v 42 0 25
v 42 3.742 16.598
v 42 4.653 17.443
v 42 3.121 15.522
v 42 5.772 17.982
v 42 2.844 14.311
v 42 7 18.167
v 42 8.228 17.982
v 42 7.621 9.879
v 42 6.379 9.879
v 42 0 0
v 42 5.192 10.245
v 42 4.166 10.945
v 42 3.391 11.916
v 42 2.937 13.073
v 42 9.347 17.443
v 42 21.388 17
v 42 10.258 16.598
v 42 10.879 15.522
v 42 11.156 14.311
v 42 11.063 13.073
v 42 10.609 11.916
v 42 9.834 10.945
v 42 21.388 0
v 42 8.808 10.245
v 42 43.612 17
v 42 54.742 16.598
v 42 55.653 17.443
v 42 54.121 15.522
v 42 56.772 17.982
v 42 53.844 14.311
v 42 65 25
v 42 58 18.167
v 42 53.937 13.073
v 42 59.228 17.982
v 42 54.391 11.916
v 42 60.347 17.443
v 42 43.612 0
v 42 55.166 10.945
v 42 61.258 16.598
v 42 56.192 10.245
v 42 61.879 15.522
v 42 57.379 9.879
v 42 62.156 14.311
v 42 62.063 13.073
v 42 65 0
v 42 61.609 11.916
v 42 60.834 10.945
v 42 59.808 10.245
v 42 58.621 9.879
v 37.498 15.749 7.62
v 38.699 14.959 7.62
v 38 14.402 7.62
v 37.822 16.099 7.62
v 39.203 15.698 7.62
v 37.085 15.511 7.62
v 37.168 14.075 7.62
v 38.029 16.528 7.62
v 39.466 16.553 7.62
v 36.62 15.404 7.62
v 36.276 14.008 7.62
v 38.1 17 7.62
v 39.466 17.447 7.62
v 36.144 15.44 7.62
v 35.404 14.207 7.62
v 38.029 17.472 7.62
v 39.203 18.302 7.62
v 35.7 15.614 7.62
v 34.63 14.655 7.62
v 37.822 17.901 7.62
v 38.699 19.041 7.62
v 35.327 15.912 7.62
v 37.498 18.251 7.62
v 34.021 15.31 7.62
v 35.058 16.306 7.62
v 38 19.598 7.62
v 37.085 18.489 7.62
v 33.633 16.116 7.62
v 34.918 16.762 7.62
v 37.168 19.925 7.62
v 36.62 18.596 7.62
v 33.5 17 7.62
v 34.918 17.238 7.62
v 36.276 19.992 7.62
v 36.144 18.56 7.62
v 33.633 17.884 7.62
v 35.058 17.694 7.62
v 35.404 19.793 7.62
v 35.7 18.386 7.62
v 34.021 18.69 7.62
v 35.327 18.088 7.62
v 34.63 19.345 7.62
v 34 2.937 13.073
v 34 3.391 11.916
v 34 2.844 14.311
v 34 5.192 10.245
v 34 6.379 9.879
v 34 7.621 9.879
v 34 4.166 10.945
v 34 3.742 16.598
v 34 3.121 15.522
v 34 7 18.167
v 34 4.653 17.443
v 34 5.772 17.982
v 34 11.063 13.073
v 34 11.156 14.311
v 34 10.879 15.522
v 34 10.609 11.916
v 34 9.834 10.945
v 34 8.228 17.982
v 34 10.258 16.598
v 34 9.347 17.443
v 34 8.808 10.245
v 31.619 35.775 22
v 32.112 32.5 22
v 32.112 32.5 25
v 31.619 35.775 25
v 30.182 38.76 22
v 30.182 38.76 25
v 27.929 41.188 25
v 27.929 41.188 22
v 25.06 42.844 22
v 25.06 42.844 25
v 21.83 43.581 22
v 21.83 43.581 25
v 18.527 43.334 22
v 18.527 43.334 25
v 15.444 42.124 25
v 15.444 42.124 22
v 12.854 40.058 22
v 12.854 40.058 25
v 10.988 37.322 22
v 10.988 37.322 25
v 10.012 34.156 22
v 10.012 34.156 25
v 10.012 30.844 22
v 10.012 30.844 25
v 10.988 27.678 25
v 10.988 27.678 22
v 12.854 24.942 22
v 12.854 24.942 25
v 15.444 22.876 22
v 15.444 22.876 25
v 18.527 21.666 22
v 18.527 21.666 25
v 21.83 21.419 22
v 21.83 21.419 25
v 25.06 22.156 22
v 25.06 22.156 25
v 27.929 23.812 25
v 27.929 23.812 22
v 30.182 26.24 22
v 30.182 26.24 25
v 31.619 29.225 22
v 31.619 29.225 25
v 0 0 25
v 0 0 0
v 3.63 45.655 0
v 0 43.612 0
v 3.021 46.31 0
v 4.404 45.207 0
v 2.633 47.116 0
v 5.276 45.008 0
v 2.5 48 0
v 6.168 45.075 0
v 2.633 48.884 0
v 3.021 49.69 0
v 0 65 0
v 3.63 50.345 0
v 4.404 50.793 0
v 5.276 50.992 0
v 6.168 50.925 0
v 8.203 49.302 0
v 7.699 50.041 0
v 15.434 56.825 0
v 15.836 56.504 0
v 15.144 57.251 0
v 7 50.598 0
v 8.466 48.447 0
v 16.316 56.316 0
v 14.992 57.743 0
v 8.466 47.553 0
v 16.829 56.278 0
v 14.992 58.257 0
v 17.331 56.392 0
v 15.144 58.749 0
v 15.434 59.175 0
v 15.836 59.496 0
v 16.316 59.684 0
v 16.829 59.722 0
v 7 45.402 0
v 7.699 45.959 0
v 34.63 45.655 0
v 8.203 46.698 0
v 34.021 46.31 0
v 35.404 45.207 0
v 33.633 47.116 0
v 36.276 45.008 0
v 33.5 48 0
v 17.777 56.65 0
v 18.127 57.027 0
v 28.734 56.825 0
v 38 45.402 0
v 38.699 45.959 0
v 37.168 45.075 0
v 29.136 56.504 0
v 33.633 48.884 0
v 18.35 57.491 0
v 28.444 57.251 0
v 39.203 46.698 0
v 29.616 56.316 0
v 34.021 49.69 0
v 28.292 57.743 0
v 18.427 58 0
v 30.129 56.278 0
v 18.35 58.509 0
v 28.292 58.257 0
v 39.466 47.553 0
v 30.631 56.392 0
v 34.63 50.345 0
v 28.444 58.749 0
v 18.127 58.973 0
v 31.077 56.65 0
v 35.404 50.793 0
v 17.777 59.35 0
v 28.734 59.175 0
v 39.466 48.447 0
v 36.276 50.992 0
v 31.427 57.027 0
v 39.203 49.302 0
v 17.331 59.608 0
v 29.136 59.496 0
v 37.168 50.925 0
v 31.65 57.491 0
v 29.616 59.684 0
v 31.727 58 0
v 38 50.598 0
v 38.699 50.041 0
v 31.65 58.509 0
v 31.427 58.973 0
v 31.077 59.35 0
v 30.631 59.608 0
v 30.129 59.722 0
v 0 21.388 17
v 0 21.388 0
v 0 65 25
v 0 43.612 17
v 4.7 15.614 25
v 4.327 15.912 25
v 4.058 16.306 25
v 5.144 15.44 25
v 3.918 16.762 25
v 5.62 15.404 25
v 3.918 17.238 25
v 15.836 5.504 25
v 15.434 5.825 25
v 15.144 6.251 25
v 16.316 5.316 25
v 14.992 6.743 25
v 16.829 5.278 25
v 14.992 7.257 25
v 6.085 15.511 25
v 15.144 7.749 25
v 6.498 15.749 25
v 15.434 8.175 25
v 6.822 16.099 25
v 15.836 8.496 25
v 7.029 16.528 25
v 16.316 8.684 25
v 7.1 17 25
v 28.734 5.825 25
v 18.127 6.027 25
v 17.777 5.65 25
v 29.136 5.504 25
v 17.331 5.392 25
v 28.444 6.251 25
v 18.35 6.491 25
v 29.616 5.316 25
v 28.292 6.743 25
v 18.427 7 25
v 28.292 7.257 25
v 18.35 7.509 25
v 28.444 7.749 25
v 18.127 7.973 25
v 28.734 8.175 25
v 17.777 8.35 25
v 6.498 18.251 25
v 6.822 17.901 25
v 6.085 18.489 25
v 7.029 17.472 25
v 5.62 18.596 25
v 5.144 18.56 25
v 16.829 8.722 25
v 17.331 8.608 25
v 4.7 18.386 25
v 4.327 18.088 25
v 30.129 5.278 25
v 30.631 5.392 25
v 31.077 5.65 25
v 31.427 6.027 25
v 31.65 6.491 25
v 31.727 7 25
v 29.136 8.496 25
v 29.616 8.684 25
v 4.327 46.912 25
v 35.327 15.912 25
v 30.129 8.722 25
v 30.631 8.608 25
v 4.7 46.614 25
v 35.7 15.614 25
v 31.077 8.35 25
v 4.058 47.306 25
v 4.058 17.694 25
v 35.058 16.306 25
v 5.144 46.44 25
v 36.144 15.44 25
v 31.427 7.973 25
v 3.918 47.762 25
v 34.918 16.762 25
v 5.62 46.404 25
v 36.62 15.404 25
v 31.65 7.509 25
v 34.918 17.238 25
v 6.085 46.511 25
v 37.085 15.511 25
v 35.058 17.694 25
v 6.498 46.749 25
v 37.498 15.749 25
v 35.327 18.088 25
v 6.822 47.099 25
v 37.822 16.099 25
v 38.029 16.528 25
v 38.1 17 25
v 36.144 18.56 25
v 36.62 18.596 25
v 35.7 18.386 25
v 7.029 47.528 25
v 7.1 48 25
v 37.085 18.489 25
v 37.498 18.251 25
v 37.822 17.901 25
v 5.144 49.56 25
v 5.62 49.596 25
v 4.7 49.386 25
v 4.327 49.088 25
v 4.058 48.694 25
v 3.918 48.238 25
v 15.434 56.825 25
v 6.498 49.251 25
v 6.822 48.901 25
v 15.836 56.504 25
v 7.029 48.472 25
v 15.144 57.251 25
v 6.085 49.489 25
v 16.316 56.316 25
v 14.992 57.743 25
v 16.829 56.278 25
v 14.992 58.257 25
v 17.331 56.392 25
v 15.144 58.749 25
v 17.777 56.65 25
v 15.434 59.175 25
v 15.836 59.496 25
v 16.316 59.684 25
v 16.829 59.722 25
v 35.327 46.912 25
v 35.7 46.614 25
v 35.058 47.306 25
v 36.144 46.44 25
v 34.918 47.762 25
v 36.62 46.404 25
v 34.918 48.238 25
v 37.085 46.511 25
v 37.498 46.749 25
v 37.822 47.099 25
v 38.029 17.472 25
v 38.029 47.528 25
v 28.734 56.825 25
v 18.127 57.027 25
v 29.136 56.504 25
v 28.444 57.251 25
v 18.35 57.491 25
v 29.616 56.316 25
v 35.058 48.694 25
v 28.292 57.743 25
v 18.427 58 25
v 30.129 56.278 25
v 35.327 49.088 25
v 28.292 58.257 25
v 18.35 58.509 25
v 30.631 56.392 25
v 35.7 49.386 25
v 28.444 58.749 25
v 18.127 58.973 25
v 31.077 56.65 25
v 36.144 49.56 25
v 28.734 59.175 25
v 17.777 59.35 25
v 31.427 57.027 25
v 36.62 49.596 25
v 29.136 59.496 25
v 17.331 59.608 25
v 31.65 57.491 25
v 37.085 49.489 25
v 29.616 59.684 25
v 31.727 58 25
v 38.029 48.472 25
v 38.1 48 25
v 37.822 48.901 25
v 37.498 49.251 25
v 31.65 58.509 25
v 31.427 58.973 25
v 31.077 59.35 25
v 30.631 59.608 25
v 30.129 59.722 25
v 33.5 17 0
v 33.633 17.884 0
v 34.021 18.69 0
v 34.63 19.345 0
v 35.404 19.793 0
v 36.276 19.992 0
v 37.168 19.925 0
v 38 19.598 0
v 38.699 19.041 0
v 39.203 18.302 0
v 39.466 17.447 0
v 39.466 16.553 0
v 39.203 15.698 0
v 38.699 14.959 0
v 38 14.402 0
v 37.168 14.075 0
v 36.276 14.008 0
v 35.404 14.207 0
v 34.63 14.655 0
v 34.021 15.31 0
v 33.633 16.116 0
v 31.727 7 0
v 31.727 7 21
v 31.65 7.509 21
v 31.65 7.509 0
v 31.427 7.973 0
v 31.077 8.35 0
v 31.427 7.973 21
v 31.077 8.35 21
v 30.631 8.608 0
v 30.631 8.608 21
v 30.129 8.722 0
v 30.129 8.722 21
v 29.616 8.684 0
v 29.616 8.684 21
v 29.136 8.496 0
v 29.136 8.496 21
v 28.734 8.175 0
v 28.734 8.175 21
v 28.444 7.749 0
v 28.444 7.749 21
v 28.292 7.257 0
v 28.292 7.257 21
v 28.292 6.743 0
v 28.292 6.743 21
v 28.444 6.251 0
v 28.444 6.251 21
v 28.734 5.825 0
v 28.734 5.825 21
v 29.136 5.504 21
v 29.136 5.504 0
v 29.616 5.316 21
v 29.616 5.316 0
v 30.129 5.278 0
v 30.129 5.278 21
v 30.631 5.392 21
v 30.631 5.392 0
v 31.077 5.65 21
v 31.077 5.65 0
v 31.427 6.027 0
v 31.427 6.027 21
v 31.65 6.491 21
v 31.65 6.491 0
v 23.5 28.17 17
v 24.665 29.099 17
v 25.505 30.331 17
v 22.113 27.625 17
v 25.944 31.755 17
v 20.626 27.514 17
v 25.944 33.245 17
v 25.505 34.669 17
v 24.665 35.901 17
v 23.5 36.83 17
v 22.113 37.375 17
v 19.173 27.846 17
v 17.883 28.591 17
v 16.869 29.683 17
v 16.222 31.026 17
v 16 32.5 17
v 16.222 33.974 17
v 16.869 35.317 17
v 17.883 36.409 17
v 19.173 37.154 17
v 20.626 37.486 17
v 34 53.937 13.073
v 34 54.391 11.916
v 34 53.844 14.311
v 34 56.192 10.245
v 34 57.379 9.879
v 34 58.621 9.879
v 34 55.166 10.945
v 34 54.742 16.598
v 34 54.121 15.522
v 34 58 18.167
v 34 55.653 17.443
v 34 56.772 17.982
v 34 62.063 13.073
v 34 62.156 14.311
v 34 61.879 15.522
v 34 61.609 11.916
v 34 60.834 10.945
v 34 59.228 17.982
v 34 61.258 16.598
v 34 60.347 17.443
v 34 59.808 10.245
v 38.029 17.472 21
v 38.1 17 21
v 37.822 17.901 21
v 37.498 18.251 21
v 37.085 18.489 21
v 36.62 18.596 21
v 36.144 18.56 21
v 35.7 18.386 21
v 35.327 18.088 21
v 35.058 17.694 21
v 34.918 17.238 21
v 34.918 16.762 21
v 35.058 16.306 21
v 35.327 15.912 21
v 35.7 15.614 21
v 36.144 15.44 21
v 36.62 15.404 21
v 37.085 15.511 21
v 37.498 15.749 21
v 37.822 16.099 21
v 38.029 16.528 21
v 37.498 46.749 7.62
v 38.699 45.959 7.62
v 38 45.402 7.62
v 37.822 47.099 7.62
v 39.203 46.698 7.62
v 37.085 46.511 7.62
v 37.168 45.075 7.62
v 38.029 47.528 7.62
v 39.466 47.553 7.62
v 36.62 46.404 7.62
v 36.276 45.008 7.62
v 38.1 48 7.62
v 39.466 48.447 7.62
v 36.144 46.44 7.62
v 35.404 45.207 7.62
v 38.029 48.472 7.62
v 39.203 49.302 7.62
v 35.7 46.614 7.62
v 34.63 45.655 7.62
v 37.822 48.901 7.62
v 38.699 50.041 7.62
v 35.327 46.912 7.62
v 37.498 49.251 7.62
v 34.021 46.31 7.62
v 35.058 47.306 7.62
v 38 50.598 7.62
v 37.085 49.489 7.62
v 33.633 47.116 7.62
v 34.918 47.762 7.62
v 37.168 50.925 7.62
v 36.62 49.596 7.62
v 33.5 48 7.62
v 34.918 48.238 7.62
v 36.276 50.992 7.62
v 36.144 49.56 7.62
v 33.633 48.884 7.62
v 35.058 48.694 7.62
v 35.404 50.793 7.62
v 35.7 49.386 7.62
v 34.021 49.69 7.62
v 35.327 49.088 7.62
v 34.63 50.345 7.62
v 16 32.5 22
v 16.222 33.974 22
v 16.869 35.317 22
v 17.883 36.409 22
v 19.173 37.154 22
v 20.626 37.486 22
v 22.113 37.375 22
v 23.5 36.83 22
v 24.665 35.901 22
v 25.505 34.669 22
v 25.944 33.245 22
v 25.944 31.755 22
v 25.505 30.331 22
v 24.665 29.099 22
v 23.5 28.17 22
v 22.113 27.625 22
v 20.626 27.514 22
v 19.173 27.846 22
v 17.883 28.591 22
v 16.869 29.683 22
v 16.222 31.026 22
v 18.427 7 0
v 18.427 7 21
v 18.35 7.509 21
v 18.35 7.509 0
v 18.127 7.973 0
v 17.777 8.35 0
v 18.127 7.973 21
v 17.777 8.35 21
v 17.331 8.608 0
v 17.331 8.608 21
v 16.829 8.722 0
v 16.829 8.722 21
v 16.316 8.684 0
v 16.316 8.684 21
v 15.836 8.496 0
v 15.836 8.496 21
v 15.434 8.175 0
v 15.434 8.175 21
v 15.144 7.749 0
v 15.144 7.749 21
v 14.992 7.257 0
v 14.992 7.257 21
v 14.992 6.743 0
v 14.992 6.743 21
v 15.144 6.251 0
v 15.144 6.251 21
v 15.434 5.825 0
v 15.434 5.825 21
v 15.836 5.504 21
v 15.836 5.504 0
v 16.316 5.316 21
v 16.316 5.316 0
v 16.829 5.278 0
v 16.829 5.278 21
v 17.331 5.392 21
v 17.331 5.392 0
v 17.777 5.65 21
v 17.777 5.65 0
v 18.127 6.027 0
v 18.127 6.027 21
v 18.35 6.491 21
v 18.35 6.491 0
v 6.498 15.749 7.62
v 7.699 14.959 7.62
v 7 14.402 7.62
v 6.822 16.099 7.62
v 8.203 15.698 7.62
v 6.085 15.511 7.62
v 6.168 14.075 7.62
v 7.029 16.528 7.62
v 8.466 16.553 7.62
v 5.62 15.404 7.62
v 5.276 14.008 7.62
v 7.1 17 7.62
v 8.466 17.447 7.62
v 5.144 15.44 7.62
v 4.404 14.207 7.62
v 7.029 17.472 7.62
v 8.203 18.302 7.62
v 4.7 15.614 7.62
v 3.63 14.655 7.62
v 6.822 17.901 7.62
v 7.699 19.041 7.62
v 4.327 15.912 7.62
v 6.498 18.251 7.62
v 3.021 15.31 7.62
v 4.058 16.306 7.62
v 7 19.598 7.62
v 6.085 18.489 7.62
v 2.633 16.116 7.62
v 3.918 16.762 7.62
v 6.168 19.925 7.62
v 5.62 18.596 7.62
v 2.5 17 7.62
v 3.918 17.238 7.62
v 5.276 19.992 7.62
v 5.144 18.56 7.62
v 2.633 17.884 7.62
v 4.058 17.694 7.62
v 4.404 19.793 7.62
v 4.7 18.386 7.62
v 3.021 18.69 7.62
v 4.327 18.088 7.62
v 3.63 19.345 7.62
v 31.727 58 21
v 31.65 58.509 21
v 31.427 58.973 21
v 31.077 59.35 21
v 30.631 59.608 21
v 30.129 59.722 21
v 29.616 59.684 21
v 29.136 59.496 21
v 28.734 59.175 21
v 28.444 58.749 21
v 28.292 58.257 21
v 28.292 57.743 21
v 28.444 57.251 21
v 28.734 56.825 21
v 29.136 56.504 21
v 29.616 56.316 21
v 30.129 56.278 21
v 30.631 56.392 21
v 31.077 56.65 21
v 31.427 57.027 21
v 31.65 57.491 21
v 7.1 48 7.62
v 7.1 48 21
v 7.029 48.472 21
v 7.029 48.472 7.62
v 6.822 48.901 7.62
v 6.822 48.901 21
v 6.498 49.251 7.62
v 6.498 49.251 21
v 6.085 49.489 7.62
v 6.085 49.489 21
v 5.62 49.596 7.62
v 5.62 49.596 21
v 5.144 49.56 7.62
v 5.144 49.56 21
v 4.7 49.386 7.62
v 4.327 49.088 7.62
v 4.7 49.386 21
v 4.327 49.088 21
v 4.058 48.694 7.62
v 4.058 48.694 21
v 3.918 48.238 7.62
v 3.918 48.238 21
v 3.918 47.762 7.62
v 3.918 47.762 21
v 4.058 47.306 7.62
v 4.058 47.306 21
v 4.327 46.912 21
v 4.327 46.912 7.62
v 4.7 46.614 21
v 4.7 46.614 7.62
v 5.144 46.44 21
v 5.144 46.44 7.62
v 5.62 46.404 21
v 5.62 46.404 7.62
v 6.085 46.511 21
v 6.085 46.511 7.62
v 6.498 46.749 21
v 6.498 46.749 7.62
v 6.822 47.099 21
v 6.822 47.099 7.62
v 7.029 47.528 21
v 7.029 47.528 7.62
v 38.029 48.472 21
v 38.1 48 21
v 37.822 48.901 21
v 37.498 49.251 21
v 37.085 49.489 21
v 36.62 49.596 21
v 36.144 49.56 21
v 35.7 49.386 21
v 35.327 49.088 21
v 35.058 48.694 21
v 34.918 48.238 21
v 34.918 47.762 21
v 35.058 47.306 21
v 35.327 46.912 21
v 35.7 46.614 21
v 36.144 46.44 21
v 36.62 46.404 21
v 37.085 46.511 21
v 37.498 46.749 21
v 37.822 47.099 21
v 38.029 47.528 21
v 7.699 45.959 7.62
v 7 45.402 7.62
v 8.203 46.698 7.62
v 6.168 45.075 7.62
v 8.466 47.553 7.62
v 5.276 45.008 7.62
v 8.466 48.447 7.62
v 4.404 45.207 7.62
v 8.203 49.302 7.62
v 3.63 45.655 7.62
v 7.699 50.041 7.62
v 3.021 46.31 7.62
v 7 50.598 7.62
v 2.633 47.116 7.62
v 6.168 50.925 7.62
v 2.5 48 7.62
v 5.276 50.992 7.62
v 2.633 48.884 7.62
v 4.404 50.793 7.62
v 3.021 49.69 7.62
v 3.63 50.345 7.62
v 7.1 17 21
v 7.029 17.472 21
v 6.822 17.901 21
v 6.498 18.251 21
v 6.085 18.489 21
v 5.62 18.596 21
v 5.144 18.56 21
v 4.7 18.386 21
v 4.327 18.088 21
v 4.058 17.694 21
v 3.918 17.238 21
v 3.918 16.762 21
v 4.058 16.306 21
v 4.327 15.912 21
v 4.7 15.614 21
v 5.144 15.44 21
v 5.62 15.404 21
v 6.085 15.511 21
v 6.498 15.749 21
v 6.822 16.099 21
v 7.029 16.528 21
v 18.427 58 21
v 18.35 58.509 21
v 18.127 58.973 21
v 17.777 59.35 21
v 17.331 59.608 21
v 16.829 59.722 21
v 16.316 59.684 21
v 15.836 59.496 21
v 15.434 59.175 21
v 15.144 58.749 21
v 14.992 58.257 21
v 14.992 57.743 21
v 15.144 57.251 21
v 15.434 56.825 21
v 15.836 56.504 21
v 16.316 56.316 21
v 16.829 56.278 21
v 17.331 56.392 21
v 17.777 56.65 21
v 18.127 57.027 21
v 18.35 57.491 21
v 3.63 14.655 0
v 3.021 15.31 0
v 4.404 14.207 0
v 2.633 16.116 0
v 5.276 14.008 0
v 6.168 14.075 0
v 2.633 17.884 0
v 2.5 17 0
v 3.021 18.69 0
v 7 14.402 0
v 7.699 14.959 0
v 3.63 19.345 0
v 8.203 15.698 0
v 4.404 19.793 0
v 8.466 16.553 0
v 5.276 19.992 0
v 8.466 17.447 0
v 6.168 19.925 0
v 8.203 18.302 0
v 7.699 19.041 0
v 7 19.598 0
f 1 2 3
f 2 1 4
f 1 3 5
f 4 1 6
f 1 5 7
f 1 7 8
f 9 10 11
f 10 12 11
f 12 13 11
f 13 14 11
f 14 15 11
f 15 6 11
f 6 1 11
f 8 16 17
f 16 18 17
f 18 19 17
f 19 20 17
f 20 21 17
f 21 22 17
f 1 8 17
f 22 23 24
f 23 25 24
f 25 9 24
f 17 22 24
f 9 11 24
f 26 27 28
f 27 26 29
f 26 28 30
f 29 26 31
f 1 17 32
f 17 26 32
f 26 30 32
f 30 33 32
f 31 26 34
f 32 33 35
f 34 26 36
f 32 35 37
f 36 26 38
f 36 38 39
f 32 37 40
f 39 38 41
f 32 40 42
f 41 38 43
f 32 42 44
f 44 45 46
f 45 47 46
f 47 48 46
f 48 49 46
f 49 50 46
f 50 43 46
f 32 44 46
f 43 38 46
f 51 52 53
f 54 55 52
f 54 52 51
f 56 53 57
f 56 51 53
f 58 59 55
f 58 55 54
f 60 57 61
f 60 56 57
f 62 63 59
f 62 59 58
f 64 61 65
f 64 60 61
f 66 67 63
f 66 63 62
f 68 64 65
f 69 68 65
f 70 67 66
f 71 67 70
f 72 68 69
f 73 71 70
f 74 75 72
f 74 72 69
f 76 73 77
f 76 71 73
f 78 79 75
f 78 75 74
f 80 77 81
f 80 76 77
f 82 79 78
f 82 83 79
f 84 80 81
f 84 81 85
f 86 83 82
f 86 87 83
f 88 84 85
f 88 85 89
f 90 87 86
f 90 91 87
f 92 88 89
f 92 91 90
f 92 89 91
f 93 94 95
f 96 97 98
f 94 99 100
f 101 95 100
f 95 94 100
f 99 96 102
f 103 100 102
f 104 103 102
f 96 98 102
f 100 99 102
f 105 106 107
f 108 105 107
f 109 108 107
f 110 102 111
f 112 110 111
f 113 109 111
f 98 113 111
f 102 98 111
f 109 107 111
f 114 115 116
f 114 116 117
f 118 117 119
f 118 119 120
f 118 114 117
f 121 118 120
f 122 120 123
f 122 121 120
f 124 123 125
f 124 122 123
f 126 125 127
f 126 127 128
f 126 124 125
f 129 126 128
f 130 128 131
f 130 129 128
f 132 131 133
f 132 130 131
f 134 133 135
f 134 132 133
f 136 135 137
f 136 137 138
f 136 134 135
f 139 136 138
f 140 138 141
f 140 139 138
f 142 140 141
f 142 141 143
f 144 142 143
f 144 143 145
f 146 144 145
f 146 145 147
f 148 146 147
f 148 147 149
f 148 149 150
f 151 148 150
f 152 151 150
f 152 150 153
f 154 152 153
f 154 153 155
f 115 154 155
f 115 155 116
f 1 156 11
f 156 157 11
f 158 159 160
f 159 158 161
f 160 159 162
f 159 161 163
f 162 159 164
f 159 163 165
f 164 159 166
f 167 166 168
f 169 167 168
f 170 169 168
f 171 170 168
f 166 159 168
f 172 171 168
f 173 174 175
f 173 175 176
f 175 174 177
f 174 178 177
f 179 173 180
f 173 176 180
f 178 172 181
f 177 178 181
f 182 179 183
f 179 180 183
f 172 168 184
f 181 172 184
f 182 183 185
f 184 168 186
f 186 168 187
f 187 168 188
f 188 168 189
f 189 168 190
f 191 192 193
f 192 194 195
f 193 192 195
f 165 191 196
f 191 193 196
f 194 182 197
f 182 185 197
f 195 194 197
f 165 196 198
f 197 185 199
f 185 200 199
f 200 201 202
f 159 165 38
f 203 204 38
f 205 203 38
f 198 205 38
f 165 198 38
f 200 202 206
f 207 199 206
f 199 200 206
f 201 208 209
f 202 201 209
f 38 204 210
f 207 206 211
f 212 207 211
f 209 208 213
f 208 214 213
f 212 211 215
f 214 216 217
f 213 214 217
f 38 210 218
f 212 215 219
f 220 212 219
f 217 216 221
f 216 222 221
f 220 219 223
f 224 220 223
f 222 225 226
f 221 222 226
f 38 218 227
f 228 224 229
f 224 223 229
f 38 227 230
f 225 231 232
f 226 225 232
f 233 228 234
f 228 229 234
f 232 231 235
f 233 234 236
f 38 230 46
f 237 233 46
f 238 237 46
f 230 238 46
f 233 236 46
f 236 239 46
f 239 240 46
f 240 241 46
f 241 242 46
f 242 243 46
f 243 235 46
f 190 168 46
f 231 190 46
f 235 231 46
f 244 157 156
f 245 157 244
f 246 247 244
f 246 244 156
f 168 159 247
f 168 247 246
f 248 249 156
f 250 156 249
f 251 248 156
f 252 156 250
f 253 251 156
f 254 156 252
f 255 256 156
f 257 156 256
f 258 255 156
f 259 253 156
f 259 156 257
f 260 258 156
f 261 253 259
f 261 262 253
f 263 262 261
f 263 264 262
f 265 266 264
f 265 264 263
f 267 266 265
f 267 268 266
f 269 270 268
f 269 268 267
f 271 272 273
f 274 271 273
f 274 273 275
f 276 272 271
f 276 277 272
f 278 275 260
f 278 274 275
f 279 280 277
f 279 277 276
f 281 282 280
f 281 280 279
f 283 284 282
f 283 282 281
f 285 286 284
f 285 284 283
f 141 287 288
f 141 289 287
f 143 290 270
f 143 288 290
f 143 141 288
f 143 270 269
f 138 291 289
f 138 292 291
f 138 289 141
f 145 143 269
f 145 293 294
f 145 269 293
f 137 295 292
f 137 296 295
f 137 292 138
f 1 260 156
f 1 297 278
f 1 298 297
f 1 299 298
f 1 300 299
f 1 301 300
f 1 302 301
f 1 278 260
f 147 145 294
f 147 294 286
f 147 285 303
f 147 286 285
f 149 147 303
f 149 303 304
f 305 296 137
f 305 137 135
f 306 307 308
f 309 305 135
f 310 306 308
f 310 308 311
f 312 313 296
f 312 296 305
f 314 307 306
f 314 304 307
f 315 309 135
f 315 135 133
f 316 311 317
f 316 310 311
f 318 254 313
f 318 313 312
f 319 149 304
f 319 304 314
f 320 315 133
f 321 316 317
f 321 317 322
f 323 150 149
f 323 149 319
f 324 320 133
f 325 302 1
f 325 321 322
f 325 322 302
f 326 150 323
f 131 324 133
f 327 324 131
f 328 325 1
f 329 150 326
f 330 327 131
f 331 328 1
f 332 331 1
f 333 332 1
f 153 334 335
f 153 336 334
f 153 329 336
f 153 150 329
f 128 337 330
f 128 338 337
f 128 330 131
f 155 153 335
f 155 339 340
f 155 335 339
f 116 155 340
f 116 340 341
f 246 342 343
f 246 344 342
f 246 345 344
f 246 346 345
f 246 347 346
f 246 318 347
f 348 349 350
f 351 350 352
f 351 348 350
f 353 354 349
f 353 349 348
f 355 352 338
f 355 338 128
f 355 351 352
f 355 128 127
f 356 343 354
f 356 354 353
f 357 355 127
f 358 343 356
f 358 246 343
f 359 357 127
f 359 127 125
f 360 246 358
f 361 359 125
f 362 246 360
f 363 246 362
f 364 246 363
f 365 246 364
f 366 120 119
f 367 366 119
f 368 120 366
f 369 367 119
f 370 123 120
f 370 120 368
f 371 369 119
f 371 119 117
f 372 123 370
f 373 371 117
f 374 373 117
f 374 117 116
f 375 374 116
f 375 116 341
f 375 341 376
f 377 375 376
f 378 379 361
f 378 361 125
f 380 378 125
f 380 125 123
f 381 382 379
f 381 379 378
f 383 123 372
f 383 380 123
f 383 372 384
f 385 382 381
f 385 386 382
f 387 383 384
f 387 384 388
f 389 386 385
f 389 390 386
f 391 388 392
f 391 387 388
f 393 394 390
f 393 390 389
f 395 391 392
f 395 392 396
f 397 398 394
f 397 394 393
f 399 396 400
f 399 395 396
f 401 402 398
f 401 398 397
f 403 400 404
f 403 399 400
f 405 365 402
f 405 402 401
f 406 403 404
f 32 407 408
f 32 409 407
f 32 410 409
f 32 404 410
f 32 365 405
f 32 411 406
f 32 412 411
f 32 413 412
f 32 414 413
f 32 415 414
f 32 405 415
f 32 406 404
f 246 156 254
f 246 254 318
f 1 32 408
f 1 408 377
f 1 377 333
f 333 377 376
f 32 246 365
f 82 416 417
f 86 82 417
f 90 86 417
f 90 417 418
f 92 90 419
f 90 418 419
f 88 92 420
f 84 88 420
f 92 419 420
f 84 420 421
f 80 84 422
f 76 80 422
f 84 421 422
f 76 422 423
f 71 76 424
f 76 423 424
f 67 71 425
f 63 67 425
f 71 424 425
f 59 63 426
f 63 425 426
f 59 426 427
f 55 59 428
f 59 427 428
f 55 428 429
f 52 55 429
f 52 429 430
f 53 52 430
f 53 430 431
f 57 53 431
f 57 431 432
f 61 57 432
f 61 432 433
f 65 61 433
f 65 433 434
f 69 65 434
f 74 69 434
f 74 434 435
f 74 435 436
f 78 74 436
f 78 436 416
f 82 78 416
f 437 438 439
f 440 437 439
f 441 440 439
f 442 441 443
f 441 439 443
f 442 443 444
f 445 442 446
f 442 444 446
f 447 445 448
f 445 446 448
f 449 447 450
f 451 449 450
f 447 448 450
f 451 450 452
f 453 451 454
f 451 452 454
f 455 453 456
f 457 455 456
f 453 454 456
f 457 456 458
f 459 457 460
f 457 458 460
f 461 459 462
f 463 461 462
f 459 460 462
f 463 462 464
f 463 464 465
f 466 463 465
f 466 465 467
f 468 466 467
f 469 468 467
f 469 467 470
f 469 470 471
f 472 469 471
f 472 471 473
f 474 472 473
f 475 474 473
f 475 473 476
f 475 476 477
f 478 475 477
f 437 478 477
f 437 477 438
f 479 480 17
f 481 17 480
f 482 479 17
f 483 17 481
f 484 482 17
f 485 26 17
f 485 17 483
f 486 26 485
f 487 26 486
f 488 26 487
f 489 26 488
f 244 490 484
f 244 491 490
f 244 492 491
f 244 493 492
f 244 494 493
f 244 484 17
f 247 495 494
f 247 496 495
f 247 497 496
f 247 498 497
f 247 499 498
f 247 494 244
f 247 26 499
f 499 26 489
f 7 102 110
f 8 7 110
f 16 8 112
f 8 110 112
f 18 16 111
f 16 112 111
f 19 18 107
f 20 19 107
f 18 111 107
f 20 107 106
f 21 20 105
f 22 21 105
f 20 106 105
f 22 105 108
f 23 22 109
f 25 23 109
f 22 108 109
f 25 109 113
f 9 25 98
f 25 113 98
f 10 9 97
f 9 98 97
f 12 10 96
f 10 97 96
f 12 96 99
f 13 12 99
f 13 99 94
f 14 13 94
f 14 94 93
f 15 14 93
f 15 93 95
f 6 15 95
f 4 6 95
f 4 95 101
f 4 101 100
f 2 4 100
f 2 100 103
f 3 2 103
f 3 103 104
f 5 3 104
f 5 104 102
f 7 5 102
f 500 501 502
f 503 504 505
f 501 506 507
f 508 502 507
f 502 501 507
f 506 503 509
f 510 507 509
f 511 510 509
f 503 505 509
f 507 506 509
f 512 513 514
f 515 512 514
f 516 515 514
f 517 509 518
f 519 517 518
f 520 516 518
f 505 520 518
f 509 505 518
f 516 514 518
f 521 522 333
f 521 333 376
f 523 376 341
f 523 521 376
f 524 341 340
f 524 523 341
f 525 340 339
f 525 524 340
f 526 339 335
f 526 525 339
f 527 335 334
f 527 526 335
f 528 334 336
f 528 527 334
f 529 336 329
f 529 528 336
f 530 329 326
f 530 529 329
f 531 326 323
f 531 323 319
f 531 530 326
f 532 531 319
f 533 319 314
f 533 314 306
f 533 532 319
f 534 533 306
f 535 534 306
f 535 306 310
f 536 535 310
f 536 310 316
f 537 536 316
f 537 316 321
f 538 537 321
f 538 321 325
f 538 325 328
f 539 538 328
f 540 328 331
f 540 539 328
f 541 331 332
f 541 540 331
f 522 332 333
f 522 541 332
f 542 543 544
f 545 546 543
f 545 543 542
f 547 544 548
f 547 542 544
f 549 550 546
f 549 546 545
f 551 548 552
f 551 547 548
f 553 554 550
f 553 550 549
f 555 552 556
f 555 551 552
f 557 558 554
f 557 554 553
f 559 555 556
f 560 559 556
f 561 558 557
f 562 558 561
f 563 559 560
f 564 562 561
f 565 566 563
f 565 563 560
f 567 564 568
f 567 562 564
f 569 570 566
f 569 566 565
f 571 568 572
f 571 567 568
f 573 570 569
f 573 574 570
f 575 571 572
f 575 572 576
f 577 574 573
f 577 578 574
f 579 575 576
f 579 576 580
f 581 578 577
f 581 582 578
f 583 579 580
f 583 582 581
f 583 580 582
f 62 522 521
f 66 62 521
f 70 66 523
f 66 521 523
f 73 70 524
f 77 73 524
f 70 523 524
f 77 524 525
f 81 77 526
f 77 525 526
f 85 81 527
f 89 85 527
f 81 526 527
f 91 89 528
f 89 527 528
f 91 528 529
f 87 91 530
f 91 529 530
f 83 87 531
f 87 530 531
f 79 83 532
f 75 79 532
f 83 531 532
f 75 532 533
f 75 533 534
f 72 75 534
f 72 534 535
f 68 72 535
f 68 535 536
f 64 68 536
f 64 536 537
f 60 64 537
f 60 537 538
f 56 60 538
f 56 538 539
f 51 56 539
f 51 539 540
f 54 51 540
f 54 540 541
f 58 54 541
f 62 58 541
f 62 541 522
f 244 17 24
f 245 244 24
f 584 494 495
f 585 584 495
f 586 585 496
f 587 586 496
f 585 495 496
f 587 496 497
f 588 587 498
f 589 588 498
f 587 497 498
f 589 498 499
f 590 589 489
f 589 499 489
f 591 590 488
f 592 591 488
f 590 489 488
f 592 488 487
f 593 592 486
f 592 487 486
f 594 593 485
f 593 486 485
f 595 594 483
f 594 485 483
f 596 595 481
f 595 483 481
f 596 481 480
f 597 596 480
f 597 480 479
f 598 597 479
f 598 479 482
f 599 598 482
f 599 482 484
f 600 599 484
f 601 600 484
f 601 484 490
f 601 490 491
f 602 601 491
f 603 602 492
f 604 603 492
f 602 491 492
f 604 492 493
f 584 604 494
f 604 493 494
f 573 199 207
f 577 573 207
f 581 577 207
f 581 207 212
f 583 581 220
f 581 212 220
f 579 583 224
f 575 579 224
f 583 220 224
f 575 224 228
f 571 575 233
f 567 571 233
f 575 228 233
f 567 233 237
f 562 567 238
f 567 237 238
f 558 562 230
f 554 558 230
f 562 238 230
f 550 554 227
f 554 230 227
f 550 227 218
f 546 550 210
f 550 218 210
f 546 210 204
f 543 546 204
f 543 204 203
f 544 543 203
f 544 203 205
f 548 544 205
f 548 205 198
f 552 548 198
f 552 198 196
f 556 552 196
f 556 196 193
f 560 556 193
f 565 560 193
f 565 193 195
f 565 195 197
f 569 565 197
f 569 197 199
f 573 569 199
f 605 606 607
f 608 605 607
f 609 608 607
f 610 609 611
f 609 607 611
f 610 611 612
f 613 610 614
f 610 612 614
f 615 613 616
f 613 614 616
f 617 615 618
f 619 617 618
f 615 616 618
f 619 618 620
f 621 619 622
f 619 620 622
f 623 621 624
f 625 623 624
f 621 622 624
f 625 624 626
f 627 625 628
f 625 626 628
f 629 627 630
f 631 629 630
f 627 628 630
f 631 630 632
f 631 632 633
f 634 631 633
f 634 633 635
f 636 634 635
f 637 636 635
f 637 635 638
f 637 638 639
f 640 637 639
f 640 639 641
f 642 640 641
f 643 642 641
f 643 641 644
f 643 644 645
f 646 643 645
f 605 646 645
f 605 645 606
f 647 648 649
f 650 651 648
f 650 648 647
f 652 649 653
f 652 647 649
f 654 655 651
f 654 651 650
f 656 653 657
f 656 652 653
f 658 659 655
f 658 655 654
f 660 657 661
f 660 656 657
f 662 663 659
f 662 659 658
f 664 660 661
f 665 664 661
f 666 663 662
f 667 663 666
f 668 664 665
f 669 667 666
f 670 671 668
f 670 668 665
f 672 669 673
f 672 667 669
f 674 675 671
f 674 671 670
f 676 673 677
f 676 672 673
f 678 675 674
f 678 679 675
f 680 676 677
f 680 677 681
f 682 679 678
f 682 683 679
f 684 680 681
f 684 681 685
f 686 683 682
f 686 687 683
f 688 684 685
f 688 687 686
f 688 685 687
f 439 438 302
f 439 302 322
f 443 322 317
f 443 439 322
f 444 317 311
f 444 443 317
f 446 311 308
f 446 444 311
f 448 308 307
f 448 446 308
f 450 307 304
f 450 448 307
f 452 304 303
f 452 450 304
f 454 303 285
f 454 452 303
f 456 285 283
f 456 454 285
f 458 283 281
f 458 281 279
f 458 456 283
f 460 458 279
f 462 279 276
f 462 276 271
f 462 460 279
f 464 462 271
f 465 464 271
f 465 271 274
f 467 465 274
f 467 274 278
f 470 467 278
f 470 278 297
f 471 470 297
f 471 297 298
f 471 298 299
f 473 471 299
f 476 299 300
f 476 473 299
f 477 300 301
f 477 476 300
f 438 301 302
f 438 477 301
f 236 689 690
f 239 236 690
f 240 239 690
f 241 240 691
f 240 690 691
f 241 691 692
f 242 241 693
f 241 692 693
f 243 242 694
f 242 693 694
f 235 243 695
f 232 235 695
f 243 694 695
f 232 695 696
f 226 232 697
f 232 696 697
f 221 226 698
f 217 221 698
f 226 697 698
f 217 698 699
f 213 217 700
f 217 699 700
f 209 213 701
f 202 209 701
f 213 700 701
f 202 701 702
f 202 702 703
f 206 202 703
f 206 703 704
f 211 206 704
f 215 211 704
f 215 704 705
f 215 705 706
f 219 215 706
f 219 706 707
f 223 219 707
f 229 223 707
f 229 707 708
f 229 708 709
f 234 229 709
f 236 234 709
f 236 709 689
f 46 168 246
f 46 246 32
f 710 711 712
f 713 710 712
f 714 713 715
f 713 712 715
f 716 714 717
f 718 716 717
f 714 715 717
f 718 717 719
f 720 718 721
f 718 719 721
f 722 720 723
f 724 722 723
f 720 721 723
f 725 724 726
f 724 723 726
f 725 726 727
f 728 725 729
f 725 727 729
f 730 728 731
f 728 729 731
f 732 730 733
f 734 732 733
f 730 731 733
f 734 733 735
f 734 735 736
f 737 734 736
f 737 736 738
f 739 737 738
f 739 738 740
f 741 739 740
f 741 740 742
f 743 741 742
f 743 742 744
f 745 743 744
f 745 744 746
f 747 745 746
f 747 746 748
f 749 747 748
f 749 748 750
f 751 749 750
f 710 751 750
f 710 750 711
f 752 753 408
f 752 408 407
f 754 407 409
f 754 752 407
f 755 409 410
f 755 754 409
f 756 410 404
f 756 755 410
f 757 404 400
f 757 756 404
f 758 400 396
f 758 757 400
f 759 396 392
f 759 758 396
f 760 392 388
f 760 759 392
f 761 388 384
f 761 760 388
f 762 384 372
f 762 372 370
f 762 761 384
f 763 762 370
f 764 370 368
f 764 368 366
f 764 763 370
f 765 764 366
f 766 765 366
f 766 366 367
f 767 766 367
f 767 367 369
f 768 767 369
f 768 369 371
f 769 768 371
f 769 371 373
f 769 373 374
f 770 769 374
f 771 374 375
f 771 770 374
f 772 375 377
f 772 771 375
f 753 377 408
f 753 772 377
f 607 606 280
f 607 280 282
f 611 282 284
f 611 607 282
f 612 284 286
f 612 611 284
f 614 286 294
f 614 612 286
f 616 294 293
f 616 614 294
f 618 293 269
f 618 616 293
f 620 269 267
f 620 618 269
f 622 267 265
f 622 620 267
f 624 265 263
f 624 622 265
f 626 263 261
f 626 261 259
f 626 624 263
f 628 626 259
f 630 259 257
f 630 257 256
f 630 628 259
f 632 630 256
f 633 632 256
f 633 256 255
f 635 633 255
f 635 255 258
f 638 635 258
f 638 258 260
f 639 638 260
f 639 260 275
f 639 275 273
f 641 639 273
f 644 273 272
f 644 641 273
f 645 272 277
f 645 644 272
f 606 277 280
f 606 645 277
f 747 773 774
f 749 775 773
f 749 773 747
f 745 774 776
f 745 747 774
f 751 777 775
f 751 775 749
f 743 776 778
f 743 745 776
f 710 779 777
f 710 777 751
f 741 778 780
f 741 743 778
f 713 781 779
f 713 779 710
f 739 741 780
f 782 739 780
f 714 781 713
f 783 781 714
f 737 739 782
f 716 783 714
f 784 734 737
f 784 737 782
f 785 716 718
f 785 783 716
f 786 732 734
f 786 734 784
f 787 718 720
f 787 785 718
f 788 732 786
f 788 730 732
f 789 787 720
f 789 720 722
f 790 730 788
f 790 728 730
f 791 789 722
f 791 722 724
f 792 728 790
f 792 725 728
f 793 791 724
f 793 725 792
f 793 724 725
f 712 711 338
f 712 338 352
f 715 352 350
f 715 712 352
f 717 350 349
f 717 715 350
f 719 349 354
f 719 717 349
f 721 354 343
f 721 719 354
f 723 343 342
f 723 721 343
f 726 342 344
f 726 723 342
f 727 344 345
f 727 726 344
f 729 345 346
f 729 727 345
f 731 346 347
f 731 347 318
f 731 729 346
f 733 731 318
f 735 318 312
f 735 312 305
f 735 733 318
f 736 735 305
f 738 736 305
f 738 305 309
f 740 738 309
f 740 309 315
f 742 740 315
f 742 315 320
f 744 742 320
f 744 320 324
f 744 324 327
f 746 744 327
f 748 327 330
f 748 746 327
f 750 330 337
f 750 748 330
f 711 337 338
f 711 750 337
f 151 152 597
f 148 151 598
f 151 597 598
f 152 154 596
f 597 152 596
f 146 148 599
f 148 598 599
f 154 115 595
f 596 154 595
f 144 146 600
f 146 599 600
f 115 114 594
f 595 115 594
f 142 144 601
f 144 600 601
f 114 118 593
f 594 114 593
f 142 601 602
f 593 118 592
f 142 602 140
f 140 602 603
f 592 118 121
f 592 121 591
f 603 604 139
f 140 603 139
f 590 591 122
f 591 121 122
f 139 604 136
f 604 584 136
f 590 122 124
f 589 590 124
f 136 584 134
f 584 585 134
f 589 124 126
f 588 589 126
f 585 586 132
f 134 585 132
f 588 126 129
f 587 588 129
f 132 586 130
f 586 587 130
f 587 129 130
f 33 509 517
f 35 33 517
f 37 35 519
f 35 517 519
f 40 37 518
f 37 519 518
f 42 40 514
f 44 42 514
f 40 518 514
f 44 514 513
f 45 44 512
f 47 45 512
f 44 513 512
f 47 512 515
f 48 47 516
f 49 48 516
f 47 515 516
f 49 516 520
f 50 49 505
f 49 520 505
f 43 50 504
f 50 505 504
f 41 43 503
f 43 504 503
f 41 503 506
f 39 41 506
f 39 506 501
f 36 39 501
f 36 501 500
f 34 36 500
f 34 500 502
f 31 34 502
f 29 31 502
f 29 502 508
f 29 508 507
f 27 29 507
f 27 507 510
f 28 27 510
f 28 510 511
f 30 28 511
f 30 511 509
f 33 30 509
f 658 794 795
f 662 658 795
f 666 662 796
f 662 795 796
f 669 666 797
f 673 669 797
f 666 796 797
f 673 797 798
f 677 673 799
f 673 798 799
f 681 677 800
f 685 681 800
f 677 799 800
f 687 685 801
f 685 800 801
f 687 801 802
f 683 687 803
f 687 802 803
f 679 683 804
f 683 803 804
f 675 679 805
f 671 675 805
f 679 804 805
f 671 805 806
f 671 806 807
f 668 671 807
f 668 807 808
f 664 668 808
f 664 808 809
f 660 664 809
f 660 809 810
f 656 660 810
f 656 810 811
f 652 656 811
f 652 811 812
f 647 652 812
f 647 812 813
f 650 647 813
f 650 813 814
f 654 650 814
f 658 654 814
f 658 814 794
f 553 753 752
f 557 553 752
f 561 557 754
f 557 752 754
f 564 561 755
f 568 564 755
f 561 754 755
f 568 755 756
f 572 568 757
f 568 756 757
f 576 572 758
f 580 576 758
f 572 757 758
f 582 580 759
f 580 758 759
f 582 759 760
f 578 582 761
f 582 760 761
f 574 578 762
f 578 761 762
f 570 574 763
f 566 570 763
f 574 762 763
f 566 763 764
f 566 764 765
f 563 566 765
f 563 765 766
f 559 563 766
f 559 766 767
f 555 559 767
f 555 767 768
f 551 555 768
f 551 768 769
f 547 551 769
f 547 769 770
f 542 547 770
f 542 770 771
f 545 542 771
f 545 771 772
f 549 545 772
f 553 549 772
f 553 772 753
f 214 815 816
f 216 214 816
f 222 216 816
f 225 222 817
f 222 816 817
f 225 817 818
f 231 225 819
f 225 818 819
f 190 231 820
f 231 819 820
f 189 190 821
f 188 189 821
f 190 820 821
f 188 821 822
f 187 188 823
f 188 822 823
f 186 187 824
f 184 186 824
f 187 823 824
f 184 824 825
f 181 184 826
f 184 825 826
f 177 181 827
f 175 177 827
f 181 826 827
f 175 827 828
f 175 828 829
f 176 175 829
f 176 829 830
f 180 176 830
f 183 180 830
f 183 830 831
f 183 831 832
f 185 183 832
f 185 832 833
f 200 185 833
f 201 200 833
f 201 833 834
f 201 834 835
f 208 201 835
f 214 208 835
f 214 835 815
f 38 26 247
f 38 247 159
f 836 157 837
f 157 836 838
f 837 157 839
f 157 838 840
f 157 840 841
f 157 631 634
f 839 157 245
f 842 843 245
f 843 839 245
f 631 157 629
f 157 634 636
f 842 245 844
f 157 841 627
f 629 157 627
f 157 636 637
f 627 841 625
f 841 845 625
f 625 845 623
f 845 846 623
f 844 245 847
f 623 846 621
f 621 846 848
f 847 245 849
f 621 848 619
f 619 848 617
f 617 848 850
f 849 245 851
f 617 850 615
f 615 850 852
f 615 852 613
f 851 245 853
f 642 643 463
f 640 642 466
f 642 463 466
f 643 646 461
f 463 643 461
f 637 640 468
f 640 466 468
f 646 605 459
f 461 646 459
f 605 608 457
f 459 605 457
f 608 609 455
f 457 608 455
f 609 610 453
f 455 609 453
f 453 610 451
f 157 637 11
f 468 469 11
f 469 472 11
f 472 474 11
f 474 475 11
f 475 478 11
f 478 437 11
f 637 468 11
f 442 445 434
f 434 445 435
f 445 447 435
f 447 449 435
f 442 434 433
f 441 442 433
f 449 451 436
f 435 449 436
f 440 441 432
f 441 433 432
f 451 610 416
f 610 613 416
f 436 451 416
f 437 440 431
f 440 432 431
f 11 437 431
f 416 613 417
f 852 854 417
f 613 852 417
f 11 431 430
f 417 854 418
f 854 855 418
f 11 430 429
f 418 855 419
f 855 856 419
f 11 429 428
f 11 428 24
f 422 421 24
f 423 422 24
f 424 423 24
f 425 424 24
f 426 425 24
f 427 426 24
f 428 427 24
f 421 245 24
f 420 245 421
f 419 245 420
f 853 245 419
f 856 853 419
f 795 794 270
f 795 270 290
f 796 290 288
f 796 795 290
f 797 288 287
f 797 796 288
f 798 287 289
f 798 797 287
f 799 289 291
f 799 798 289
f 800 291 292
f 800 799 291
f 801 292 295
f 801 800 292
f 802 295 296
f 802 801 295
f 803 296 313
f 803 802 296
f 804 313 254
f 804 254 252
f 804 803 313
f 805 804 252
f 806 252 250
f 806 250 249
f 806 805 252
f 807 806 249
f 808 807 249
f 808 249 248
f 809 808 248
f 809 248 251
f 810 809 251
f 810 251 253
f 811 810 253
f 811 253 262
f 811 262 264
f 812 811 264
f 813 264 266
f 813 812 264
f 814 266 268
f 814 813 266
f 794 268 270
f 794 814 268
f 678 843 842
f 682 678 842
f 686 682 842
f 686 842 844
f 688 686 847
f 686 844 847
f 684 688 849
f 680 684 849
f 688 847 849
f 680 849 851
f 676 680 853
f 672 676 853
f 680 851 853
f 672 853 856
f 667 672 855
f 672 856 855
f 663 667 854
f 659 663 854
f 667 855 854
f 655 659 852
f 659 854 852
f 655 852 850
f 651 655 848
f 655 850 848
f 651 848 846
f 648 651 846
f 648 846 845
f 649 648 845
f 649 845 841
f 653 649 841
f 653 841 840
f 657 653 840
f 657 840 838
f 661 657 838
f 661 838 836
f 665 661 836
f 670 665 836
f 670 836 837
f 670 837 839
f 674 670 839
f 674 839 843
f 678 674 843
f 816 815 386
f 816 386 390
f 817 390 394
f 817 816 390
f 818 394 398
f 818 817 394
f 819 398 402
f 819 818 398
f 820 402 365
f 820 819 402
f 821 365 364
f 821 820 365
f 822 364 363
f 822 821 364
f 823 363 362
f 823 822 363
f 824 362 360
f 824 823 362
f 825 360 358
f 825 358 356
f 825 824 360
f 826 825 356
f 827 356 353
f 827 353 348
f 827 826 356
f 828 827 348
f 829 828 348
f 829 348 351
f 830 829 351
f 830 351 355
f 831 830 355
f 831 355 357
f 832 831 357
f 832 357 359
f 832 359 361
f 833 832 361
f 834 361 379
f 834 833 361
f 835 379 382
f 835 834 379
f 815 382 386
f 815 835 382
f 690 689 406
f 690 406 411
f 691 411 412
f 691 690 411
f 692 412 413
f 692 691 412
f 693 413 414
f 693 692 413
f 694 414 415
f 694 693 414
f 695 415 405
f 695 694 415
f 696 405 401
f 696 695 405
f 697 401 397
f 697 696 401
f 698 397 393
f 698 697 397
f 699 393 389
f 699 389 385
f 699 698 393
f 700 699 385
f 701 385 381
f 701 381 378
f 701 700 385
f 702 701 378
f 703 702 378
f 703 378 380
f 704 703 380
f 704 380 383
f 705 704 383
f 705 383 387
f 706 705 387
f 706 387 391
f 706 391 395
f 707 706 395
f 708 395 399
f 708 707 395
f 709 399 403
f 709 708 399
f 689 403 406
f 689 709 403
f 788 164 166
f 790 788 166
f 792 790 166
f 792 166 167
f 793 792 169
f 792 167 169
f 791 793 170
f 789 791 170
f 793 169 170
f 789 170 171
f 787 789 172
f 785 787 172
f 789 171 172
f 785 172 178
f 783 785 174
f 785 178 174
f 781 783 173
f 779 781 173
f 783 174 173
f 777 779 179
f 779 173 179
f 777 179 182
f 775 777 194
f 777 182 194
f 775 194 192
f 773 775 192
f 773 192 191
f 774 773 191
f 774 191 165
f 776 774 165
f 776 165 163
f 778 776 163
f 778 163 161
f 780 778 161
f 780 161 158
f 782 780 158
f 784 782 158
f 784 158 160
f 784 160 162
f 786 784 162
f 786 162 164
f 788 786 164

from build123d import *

# Parameters (mm, degrees)
ESBO_O1_W                                            = 42
ESBO_O1_H                                            = 65
RESSALTO_EXTRUS_O1_DEPTH                             = 21
ESBO_O2_W                                            = 17
ESBO_O2_H                                            = 22.225
CORTE_EXTRUS_O1_DEPTH                                = 43
FURO_COM_FOLGA_DE_M31_D                              = 3.4544
FURO_COM_FOLGA_DE_M31_DEPTH                          = 21
FURO_COM_FOLGA_DE_M201_D                             = 22.225
FURO_COM_FOLGA_DE_M201_DEPTH                         = 21
REBAIXO_PARA_PARAFUSO_DE_M_QUINA_DE_CABE_D           = 3.2
REBAIXO_PARA_PARAFUSO_DE_M_QUINA_DE_CABE_DEPTH       = 21
REBAIXO_PARA_PARAFUSO_DE_M_QUINA_DE_CABE_CBORE_D     = 6
REBAIXO_PARA_PARAFUSO_DE_M_QUINA_DE_CABE_CBORE_DEPTH = 7.62
FURO1_D                                              = 8.334375
FURO1_DEPTH                                          = 8
ESBO_O11_W                                           = 42
ESBO_O11_H                                           = 65
ESBO_O11_R                                           = 11.1125
ESBO_O11_R_2                                         = 1.7272
ESBO_O11_R_3                                         = 1.6
RESSALTO_EXTRUS_O2_DEPTH                             = 4
ESBO_O13_R                                           = 11.1125
ESBO_O13_R_2                                         = 5
RESSALTO_EXTRUS_O3_DEPTH                             = 5


with BuildPart() as part:
    # Esboço1 → Ressalto-extrusão1 (new body)
    with BuildSketch(Plane.XY.offset(21)):
        with Locations((21, 32.5)):
            Rectangle(ESBO_O1_W, ESBO_O1_H)
    extrude(amount=-RESSALTO_EXTRUS_O1_DEPTH)

    # Esboço2 → Corte-extrusão1 (cut, through all)
    with BuildSketch(Plane(origin=(42, 0, 0), x_dir=(0, 0, -1), z_dir=(1, 0, 0))):
        with Locations((-8.5, 32.5)):
            Rectangle(ESBO_O2_W, ESBO_O2_H)
    extrude(amount=-CORTE_EXTRUS_O1_DEPTH, mode=Mode.SUBTRACT)

    # Furo com folga de M31
    with Locations(Plane(origin=(0, 0, 0), x_dir=(-1, 0, 0), z_dir=(0, 0, -1))):
        with Locations((-30, 7), (-16.7, 7), (-16.7, 58), (-30, 58)):
            Hole(FURO_COM_FOLGA_DE_M31_D / 2, depth=FURO_COM_FOLGA_DE_M31_DEPTH)

    # Furo com folga de M201
    with Locations(Plane.XY.offset(21)):
        with Locations((21, 32.5)):
            Hole(FURO_COM_FOLGA_DE_M201_D / 2, depth=FURO_COM_FOLGA_DE_M201_DEPTH)

    # Rebaixo para parafuso de máquina de cabeça sextavada de M31
    with Locations(Plane(origin=(0, 0, 0), x_dir=(-1, 0, 0), z_dir=(0, 0, -1))):
        with Locations((-36.5, 17), (-5.5, 17), (-5.5, 48), (-36.5, 48)):
            CounterBoreHole(REBAIXO_PARA_PARAFUSO_DE_M_QUINA_DE_CABE_D / 2, REBAIXO_PARA_PARAFUSO_DE_M_QUINA_DE_CABE_CBORE_D / 2, REBAIXO_PARA_PARAFUSO_DE_M_QUINA_DE_CABE_CBORE_DEPTH, depth=REBAIXO_PARA_PARAFUSO_DE_M_QUINA_DE_CABE_DEPTH)

    # Furo1
    with Locations(Plane(origin=(42, 0, 0), x_dir=(0, 0, -1), z_dir=(1, 0, 0))):
        with Locations((-14, 7), (-14, 58)):
            Hole(FURO1_D / 2, depth=FURO1_DEPTH)

    # Esboço11 → Ressalto-extrusão2 (add)
    with BuildSketch(Plane.XY.offset(21)):
        with Locations((21, 32.5)):
            Rectangle(ESBO_O11_W, ESBO_O11_H)
        with Locations((21, 32.5)):
            Circle(ESBO_O11_R, mode=Mode.SUBTRACT)
        with Locations((16.7, 7)):
            Circle(ESBO_O11_R_2, mode=Mode.SUBTRACT)
        with Locations((30, 7)):
            Circle(ESBO_O11_R_2, mode=Mode.SUBTRACT)
        with Locations((5.5, 17)):
            Circle(ESBO_O11_R_3, mode=Mode.SUBTRACT)
        with Locations((5.5, 48)):
            Circle(ESBO_O11_R_3, mode=Mode.SUBTRACT)
        with Locations((16.7, 58)):
            Circle(ESBO_O11_R_2, mode=Mode.SUBTRACT)
        with Locations((36.5, 48)):
            Circle(ESBO_O11_R_3, mode=Mode.SUBTRACT)
        with Locations((30, 58)):
            Circle(ESBO_O11_R_2, mode=Mode.SUBTRACT)
        with Locations((36.5, 17)):
            Circle(ESBO_O11_R_3, mode=Mode.SUBTRACT)
    extrude(amount=RESSALTO_EXTRUS_O2_DEPTH)

    # Esboço13 → Ressalto-extrusão3 (add)
    with BuildSketch(Plane(origin=(0, 0, 17), x_dir=(-1, 0, 0), z_dir=(0, 0, -1))):
        with Locations((-21, 32.5)):
            Circle(ESBO_O13_R)
        with Locations((-21, 32.5)):
            Circle(ESBO_O13_R_2, mode=Mode.SUBTRACT)
    extrude(amount=-RESSALTO_EXTRUS_O3_DEPTH)


solid = part.part
